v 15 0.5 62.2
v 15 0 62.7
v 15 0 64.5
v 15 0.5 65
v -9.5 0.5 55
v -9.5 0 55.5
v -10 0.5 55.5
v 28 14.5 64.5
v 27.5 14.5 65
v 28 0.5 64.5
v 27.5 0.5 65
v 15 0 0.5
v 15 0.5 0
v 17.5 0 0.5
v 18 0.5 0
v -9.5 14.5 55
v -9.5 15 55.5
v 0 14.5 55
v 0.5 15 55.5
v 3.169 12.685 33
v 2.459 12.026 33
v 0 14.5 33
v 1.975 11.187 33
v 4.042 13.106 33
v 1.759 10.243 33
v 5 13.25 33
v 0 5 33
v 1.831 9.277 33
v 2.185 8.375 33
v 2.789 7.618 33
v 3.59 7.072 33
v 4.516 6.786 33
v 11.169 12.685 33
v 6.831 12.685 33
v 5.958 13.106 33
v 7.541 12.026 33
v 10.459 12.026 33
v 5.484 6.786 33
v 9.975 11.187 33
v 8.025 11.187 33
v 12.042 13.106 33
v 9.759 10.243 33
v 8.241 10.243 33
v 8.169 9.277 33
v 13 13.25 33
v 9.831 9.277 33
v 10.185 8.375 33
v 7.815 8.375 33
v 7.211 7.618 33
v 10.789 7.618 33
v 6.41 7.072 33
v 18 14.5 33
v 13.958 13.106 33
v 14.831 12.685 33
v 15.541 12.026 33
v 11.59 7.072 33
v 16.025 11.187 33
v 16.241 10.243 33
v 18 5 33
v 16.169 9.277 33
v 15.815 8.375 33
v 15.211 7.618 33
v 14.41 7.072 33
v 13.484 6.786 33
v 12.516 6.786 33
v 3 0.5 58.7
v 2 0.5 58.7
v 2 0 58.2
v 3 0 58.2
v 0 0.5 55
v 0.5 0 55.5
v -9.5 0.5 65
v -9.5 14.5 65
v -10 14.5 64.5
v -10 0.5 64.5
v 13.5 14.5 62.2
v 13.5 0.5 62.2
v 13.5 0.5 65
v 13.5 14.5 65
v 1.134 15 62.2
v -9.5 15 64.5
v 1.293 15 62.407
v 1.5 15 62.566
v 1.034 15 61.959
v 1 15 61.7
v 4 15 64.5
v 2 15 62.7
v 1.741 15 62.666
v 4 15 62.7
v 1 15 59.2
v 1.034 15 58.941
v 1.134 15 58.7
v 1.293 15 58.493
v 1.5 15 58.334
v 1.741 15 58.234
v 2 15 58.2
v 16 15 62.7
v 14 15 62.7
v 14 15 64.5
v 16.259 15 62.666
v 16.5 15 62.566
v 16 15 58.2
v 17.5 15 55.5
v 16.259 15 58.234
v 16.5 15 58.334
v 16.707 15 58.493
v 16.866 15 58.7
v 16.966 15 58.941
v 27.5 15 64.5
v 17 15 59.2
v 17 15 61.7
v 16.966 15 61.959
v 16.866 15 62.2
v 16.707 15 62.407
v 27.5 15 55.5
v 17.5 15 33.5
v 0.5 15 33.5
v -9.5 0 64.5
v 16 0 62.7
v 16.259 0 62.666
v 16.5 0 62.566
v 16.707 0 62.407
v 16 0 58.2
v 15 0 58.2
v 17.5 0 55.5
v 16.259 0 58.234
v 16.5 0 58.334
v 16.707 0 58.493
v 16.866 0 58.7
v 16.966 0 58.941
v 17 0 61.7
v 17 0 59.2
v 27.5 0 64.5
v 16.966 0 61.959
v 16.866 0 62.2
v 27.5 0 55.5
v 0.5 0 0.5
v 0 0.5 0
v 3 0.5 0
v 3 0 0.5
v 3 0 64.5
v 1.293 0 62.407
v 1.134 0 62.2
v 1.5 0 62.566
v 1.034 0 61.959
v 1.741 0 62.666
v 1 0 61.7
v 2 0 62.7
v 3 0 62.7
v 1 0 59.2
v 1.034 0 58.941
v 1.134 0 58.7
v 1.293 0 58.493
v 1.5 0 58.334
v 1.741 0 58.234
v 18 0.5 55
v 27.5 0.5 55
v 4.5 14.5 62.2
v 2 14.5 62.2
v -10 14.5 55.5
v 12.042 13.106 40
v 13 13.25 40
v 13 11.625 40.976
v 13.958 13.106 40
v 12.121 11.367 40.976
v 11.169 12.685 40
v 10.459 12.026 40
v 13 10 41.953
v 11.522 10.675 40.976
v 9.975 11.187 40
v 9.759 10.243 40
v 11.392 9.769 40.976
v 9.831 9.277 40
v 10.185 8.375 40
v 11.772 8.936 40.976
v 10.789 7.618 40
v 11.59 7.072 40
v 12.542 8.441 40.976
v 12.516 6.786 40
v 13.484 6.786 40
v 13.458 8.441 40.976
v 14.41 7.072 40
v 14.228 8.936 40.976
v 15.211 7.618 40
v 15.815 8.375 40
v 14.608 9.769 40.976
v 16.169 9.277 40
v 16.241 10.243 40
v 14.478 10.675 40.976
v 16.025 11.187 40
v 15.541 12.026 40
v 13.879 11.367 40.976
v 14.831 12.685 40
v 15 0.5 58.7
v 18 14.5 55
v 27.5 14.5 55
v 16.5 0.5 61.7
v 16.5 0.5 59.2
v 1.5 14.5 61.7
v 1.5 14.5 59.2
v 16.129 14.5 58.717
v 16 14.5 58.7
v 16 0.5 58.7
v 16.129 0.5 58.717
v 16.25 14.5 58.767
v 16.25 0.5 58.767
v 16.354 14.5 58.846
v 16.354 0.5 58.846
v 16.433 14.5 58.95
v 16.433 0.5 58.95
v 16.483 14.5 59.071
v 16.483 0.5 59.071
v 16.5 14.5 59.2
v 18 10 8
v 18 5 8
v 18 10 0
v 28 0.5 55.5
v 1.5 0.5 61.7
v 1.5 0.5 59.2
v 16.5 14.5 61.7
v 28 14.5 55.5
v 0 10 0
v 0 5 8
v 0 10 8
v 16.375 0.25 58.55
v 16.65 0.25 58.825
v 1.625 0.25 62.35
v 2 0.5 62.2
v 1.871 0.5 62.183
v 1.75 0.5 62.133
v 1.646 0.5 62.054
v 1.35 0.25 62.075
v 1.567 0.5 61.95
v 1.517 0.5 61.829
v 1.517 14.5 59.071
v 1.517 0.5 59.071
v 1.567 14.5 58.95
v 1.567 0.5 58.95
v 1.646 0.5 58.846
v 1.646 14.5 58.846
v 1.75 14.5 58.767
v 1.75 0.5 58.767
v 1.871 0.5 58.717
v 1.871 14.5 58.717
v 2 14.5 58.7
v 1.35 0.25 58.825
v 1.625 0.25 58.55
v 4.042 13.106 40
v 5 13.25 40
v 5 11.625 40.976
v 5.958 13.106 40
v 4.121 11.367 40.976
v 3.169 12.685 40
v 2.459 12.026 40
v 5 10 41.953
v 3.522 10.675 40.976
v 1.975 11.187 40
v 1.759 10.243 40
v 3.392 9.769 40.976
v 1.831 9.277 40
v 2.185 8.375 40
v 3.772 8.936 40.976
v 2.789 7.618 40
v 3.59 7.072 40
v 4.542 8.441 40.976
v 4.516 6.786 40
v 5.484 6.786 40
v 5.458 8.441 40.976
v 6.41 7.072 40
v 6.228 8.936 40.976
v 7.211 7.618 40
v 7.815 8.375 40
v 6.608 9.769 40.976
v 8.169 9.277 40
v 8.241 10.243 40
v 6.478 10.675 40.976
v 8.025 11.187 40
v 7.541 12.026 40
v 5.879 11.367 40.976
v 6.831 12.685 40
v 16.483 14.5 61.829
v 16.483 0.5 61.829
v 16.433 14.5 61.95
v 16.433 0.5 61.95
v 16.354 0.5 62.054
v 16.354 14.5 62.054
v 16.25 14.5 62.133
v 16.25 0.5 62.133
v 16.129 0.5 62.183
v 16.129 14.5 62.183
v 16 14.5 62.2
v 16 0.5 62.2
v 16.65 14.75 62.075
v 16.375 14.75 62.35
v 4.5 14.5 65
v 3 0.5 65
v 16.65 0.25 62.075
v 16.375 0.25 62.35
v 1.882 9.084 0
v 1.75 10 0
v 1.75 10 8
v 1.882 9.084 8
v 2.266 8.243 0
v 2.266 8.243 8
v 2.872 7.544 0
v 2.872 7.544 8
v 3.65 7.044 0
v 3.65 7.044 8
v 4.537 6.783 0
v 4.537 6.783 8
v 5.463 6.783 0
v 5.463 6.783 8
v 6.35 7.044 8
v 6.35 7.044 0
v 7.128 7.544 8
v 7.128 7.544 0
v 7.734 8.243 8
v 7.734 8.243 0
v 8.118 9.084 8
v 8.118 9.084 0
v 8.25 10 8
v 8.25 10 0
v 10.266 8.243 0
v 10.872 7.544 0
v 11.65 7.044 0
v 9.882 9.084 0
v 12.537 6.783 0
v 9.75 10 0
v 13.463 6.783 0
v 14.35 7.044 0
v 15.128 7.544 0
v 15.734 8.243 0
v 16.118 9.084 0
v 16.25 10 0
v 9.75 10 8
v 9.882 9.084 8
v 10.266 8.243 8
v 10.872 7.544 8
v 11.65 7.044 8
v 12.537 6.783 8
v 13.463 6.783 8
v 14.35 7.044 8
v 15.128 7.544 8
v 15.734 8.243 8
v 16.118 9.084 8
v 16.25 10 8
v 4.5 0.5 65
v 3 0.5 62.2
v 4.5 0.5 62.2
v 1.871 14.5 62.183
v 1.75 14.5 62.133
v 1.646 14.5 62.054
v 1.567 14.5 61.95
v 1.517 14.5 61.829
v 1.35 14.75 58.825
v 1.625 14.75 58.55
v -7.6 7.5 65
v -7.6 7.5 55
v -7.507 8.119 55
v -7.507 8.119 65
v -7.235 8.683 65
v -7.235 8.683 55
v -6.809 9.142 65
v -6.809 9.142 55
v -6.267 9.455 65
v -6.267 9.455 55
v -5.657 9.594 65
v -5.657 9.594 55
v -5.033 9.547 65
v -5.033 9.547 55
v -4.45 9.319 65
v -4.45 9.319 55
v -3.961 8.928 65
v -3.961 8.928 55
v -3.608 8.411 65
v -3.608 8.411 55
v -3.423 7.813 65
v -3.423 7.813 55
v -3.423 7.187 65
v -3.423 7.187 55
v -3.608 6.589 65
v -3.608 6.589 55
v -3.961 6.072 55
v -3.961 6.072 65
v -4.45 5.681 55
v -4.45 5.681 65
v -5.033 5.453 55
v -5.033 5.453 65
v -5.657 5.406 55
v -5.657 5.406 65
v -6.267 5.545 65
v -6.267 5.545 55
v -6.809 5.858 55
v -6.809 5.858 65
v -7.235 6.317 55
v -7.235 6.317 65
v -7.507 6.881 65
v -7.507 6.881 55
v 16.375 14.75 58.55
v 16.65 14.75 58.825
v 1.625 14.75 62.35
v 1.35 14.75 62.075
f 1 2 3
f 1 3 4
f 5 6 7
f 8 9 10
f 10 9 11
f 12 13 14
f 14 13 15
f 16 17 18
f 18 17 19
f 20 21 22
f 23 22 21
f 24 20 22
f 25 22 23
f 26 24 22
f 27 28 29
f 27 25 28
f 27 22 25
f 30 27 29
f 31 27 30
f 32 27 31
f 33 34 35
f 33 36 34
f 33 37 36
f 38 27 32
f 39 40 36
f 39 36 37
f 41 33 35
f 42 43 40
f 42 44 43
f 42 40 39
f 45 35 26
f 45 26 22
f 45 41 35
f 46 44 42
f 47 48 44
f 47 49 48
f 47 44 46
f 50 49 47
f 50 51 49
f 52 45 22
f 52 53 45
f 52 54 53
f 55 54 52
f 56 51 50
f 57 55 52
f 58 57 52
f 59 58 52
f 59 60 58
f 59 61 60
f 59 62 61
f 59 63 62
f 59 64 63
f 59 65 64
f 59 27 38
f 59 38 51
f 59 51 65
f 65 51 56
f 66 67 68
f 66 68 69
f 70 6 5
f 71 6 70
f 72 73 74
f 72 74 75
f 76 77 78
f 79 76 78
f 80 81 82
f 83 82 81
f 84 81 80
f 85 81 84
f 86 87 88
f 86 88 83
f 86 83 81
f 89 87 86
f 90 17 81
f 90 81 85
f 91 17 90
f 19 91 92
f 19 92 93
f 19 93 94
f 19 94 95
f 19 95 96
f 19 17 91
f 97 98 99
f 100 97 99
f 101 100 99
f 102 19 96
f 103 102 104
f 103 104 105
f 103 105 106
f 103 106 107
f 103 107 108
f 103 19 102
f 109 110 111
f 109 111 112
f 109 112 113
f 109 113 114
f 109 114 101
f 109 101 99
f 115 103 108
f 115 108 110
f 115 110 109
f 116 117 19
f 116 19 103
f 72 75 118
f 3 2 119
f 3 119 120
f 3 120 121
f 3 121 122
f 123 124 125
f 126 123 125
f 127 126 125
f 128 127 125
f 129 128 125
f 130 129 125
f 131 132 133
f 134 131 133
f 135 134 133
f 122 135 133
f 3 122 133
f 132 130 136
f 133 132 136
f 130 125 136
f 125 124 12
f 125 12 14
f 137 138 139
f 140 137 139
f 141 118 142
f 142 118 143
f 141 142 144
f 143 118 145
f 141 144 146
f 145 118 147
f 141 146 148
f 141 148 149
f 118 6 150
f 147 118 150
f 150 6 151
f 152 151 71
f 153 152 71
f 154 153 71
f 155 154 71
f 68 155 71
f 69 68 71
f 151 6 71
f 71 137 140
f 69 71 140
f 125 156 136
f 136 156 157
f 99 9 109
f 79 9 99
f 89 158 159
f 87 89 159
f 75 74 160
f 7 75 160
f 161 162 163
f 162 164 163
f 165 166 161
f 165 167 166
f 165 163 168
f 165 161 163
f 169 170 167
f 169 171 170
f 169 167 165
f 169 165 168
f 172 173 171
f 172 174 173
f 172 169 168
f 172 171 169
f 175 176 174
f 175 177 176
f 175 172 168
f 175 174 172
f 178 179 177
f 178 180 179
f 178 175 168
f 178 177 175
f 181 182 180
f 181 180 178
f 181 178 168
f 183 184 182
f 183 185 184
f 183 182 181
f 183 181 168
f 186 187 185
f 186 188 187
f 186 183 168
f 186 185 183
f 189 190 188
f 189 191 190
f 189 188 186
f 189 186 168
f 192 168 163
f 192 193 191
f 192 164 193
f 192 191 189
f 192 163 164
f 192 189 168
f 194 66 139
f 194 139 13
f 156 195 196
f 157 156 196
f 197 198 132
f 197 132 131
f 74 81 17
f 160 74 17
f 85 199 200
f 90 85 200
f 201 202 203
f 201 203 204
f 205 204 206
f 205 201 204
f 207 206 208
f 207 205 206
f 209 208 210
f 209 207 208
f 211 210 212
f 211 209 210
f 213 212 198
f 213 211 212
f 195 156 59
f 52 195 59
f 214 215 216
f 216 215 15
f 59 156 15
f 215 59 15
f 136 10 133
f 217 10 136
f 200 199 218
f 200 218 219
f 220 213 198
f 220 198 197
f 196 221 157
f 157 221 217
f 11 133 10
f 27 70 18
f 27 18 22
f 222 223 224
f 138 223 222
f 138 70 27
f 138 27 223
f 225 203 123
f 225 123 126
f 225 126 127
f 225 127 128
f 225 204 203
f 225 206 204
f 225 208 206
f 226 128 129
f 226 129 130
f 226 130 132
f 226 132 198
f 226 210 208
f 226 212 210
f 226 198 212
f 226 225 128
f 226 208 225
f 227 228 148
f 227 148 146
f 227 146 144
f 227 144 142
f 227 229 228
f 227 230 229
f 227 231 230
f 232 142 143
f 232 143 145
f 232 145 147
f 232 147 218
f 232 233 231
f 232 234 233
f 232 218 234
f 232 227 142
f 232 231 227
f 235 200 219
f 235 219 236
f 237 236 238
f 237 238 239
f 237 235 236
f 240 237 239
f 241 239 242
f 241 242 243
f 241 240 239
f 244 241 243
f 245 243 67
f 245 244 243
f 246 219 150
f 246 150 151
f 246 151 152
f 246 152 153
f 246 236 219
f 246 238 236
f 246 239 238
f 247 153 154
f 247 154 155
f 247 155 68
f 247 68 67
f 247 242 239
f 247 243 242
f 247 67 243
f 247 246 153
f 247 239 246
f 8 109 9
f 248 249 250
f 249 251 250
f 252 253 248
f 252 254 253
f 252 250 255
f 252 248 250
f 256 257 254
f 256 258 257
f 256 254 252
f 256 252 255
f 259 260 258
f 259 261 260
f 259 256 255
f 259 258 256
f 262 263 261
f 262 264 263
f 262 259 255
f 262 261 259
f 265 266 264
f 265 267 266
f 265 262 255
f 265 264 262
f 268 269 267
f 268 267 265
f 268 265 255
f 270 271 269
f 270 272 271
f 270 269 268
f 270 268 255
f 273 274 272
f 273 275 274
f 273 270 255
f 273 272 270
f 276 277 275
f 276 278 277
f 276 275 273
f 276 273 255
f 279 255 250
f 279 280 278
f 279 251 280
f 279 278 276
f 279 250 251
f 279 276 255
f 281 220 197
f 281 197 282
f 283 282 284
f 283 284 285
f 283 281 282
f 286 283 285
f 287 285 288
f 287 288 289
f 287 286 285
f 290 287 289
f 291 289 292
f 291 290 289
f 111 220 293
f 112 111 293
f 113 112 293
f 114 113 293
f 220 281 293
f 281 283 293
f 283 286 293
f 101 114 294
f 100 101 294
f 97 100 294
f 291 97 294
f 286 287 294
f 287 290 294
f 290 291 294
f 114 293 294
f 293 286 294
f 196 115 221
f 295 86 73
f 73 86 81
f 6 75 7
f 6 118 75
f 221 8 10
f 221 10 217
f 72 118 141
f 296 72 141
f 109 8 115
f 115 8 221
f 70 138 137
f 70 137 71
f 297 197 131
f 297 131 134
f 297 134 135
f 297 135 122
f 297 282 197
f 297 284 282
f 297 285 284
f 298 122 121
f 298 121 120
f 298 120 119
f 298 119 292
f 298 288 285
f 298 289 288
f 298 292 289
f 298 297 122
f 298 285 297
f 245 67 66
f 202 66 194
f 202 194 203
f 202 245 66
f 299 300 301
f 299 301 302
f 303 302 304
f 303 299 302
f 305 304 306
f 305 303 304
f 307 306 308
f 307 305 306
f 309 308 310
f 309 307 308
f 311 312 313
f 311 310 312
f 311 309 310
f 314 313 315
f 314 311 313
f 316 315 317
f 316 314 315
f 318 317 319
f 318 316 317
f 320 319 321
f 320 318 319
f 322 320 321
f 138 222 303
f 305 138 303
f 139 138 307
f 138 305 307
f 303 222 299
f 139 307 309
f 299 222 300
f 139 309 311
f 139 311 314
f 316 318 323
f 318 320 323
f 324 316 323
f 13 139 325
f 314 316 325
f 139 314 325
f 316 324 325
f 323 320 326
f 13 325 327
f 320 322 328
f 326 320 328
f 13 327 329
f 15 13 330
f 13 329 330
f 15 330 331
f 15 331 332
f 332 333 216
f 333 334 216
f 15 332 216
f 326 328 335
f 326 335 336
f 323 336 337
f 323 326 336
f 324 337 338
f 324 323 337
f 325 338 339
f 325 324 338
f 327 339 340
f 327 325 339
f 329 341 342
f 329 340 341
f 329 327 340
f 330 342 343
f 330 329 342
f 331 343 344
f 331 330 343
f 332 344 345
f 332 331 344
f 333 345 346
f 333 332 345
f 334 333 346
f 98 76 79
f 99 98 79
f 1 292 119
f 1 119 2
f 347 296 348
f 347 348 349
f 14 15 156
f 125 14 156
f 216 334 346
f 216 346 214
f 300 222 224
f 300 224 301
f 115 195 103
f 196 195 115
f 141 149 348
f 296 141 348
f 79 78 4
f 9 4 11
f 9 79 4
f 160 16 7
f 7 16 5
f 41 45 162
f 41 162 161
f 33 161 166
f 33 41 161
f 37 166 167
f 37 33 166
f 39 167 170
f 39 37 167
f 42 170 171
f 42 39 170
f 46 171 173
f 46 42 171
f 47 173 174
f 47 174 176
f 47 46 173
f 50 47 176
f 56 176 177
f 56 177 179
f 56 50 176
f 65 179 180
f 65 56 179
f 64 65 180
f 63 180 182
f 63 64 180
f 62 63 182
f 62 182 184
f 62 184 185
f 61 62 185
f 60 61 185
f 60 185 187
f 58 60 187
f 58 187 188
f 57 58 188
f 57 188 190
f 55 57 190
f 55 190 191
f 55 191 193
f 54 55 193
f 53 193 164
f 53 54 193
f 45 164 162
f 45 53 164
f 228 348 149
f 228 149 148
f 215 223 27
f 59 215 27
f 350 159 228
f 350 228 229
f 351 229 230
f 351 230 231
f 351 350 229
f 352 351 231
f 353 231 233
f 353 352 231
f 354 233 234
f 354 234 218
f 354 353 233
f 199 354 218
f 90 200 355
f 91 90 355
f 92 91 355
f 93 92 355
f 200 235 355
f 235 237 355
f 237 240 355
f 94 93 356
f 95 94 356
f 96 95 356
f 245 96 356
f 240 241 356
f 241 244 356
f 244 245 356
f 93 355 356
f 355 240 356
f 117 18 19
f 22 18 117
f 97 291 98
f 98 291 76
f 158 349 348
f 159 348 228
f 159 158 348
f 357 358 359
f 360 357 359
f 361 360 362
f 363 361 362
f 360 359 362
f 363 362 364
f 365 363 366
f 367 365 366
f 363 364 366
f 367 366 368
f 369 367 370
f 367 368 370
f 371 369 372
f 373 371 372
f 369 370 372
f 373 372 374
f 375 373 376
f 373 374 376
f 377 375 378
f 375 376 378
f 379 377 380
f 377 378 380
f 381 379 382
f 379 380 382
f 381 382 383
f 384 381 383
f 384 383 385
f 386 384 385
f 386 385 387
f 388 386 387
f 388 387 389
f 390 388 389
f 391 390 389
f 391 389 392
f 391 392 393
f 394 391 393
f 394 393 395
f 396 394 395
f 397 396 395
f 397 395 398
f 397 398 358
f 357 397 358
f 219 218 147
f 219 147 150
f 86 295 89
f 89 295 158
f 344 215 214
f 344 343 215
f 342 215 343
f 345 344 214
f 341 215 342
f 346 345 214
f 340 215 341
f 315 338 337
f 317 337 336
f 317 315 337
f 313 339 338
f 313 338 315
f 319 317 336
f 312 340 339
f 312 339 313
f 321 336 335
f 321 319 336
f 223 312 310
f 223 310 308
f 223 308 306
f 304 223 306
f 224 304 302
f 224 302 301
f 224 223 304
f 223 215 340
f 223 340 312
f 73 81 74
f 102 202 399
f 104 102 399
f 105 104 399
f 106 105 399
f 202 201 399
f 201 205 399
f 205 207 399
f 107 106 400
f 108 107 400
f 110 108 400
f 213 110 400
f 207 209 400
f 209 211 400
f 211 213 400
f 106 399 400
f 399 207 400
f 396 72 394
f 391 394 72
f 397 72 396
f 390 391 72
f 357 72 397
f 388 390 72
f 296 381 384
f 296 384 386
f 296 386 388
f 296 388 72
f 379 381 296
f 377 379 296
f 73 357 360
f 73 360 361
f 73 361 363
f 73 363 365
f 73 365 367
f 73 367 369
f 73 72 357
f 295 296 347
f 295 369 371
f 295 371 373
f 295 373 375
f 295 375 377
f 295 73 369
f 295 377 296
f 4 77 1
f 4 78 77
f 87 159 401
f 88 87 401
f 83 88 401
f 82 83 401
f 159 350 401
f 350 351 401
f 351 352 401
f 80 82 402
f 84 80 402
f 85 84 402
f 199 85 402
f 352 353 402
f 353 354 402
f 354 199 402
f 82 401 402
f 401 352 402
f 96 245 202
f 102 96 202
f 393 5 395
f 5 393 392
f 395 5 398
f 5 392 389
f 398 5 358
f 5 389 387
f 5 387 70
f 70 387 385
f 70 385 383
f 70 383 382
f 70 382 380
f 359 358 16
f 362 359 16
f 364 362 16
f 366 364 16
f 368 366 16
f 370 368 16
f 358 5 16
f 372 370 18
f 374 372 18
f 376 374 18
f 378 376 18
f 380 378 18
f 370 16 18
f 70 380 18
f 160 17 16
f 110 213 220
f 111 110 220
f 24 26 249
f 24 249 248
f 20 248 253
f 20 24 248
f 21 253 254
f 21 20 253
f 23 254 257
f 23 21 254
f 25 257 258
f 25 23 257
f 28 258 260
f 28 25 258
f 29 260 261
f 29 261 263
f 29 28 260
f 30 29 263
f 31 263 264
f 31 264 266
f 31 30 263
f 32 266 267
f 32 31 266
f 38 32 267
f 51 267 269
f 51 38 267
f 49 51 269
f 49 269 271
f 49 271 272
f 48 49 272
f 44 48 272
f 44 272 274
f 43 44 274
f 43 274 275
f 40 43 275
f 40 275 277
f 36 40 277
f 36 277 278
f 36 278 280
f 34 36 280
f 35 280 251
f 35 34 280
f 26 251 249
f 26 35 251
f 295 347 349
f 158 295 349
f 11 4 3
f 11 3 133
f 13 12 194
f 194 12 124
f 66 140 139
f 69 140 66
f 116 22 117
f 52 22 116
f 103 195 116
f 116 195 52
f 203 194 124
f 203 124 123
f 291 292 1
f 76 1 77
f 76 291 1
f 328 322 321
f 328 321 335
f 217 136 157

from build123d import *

# Parameters (mm, degrees)
SKETCH_1_W             = 18
SKETCH_1_H             = 10
EXTRUDE_1_DEPTH        = 65
SKETCH_2_W             = 25
SKETCH_2_H             = 5
CUT_EXTRUDE_1_DEPTH    = 69.183575735
SKETCH_3_W             = 18
SKETCH_3_H             = 32
EXTRUDE_2_DEPTH        = 5
SKETCH_4_W             = 38
SKETCH_4_H             = 10
EXTRUDE_3_DEPTH        = 15
HOLE_WIZARD_M5_1_D     = 4.2
PATTERN_LINEAR_2_COUNT = 2
PATTERN_LINEAR_2_PITCH = 8
CUT_EXTRUDE_2_DEPTH    = 73.346388991
CHAMFER_1_SIZE         = 0.5
SKETCH_10_W            = 12
SKETCH_10_H            = 77.617391284
CUT_EXTRUDE_3_DEPTH    = 0.5


with BuildPart() as part:
    # 草图1 → 凸台-拉伸1 (new body)
    with BuildSketch(Plane.XY):
        with Locations((9, 5)):
            Rectangle(SKETCH_1_W, SKETCH_1_H)
    extrude(amount=EXTRUDE_1_DEPTH)

    # 草图2 → 切除-拉伸1 (cut, through all)
    with BuildSketch(Plane.ZY):
        with Locations((20.5, 7.5)):
            Rectangle(SKETCH_2_W, SKETCH_2_H)
    extrude(amount=-CUT_EXTRUDE_1_DEPTH, mode=Mode.SUBTRACT)

    # 草图3 → 凸台-拉伸2 (add)
    with BuildSketch(Plane(origin=(0, 10, 0), x_dir=(1, 0, 0), z_dir=(0, 1, 0))):
        with Locations((9, -49)):
            Rectangle(SKETCH_3_W, SKETCH_3_H)
    extrude(amount=EXTRUDE_2_DEPTH)

    # 草图4 → 凸台-拉伸3 (add)
    with BuildSketch(Plane(origin=(0, 15, 0), x_dir=(1, 0, 0), z_dir=(0, 1, 0))):
        with Locations((9, -60)):
            Rectangle(SKETCH_4_W, SKETCH_4_H)
    extrude(amount=-EXTRUDE_3_DEPTH)

    # M5 螺纹孔1 (through all)
    with Locations(Plane.XY.offset(65)):
        with Locations((-5.5, 7.5)):
            Hole(HOLE_WIZARD_M5_1_D / 2)

    # 草图7 → Ø6.5 (6.5) 直径孔1 (revolve, cut)
    with BuildSketch(Plane(origin=(13, 10, 0), x_dir=(0, 1, 0), z_dir=(1, 0, 0))):
        Polygon((0, 0), (0, 41.952797012), (3.25, 40), (3.25, 0), align=None)
    hole_wizard_6_5_6_5_1 = revolve(axis=Axis((13, 10, -6.35), (0, 0, 1)), mode=Mode.SUBTRACT)

    # 阵列(线性)2: Ø6.5 (6.5) 直径孔1 ×2
    with Locations(*[(-i * PATTERN_LINEAR_2_PITCH, 0, 0) for i in range(1, PATTERN_LINEAR_2_COUNT)]):
        add(hole_wizard_6_5_6_5_1, mode=Mode.SUBTRACT)

    # 草图9 → 切除-拉伸2 (cut, through all)
    with BuildSketch(Plane(origin=(0, 15, 0), x_dir=(1, 0, 0), z_dir=(0, 1, 0))):
        with BuildLine():
            Line((13.5, -65), (4.5, -65))
            Line((4.5, -65), (4.5, -62.2))
            Line((4.5, -62.2), (2, -62.2))
            ThreePointArc((2, -62.2), (1.646446609, -62.053553391), (1.5, -61.7))
            Line((1.5, -61.7), (1.5, -59.2))
            ThreePointArc((1.5, -59.2), (1.646446609, -58.846446609), (2, -58.7))
            Line((2, -58.7), (16, -58.7))
            ThreePointArc((16, -58.7), (16.353553391, -58.846446609), (16.5, -59.2))
            Line((16.5, -59.2), (16.5, -61.7))
            ThreePointArc((16.5, -61.7), (16.353553391, -62.053553391), (16, -62.2))
            Line((16, -62.2), (13.5, -62.2))
            Line((13.5, -62.2), (13.5, -65))
        make_face()
    extrude(amount=-CUT_EXTRUDE_2_DEPTH, mode=Mode.SUBTRACT)

    # 倒角1
    chamfer_1_edges = [part.edges().sort_by_distance(p)[0] for p in [
        (20.75, 15, 65),
        (20.75, 0, 65),
        (13.5, 0, 63.6),
        (4.5, 0, 63.6),
        (3.25, 0, 62.2),
        (1.646446609, 0, 62.053553391),
        (1.5, 0, 60.45),
        (1.646446609, 0, 58.846446609),
        (9, 0, 58.7),
        (16.353553391, 0, 58.846446609),
        (16.5, 0, 60.45),
        (16.353553391, 0, 62.053553391),
        (14.75, 0, 62.2),
        (13.5, 15, 63.6),
        (14.75, 15, 62.2),
        (16.353553391, 15, 62.053553391),
        (16.5, 15, 60.45),
        (16.353553391, 15, 58.846446609),
        (9, 15, 58.7),
        (1.646446609, 15, 58.846446609),
        (1.5, 15, 60.45),
        (1.646446609, 15, 62.053553391),
        (3.25, 15, 62.2),
        (4.5, 15, 63.6),
        (9, 15, 33),
        (0, 15, 44),
        (-2.75, 15, 65),
        (18, 15, 44),
        (18, 0, 27.5),
        (0, 0, 27.5),
        (-5, 15, 55),
        (-10, 15, 60),
        (23, 15, 55),
        (28, 15, 60),
        (-5, 0, 55),
        (-10, 0, 60),
        (23, 0, 55),
        (28, 0, 60),
        (-10, 7.5, 55),
        (28, 7.5, 65),
        (-10, 7.5, 65),
        (28, 7.5, 55),
        (9, 0, 0),
        (-2.75, 0, 65),
    ]]
    chamfer(chamfer_1_edges, length=CHAMFER_1_SIZE)

    # 草图10 → 切除-拉伸3 (cut)
    with BuildSketch(Plane.XZ):
        with Locations((9, 33.316007813)):
            Rectangle(SKETCH_10_W, SKETCH_10_H)
    extrude(amount=-CUT_EXTRUDE_3_DEPTH, mode=Mode.SUBTRACT)


solid = part.part
